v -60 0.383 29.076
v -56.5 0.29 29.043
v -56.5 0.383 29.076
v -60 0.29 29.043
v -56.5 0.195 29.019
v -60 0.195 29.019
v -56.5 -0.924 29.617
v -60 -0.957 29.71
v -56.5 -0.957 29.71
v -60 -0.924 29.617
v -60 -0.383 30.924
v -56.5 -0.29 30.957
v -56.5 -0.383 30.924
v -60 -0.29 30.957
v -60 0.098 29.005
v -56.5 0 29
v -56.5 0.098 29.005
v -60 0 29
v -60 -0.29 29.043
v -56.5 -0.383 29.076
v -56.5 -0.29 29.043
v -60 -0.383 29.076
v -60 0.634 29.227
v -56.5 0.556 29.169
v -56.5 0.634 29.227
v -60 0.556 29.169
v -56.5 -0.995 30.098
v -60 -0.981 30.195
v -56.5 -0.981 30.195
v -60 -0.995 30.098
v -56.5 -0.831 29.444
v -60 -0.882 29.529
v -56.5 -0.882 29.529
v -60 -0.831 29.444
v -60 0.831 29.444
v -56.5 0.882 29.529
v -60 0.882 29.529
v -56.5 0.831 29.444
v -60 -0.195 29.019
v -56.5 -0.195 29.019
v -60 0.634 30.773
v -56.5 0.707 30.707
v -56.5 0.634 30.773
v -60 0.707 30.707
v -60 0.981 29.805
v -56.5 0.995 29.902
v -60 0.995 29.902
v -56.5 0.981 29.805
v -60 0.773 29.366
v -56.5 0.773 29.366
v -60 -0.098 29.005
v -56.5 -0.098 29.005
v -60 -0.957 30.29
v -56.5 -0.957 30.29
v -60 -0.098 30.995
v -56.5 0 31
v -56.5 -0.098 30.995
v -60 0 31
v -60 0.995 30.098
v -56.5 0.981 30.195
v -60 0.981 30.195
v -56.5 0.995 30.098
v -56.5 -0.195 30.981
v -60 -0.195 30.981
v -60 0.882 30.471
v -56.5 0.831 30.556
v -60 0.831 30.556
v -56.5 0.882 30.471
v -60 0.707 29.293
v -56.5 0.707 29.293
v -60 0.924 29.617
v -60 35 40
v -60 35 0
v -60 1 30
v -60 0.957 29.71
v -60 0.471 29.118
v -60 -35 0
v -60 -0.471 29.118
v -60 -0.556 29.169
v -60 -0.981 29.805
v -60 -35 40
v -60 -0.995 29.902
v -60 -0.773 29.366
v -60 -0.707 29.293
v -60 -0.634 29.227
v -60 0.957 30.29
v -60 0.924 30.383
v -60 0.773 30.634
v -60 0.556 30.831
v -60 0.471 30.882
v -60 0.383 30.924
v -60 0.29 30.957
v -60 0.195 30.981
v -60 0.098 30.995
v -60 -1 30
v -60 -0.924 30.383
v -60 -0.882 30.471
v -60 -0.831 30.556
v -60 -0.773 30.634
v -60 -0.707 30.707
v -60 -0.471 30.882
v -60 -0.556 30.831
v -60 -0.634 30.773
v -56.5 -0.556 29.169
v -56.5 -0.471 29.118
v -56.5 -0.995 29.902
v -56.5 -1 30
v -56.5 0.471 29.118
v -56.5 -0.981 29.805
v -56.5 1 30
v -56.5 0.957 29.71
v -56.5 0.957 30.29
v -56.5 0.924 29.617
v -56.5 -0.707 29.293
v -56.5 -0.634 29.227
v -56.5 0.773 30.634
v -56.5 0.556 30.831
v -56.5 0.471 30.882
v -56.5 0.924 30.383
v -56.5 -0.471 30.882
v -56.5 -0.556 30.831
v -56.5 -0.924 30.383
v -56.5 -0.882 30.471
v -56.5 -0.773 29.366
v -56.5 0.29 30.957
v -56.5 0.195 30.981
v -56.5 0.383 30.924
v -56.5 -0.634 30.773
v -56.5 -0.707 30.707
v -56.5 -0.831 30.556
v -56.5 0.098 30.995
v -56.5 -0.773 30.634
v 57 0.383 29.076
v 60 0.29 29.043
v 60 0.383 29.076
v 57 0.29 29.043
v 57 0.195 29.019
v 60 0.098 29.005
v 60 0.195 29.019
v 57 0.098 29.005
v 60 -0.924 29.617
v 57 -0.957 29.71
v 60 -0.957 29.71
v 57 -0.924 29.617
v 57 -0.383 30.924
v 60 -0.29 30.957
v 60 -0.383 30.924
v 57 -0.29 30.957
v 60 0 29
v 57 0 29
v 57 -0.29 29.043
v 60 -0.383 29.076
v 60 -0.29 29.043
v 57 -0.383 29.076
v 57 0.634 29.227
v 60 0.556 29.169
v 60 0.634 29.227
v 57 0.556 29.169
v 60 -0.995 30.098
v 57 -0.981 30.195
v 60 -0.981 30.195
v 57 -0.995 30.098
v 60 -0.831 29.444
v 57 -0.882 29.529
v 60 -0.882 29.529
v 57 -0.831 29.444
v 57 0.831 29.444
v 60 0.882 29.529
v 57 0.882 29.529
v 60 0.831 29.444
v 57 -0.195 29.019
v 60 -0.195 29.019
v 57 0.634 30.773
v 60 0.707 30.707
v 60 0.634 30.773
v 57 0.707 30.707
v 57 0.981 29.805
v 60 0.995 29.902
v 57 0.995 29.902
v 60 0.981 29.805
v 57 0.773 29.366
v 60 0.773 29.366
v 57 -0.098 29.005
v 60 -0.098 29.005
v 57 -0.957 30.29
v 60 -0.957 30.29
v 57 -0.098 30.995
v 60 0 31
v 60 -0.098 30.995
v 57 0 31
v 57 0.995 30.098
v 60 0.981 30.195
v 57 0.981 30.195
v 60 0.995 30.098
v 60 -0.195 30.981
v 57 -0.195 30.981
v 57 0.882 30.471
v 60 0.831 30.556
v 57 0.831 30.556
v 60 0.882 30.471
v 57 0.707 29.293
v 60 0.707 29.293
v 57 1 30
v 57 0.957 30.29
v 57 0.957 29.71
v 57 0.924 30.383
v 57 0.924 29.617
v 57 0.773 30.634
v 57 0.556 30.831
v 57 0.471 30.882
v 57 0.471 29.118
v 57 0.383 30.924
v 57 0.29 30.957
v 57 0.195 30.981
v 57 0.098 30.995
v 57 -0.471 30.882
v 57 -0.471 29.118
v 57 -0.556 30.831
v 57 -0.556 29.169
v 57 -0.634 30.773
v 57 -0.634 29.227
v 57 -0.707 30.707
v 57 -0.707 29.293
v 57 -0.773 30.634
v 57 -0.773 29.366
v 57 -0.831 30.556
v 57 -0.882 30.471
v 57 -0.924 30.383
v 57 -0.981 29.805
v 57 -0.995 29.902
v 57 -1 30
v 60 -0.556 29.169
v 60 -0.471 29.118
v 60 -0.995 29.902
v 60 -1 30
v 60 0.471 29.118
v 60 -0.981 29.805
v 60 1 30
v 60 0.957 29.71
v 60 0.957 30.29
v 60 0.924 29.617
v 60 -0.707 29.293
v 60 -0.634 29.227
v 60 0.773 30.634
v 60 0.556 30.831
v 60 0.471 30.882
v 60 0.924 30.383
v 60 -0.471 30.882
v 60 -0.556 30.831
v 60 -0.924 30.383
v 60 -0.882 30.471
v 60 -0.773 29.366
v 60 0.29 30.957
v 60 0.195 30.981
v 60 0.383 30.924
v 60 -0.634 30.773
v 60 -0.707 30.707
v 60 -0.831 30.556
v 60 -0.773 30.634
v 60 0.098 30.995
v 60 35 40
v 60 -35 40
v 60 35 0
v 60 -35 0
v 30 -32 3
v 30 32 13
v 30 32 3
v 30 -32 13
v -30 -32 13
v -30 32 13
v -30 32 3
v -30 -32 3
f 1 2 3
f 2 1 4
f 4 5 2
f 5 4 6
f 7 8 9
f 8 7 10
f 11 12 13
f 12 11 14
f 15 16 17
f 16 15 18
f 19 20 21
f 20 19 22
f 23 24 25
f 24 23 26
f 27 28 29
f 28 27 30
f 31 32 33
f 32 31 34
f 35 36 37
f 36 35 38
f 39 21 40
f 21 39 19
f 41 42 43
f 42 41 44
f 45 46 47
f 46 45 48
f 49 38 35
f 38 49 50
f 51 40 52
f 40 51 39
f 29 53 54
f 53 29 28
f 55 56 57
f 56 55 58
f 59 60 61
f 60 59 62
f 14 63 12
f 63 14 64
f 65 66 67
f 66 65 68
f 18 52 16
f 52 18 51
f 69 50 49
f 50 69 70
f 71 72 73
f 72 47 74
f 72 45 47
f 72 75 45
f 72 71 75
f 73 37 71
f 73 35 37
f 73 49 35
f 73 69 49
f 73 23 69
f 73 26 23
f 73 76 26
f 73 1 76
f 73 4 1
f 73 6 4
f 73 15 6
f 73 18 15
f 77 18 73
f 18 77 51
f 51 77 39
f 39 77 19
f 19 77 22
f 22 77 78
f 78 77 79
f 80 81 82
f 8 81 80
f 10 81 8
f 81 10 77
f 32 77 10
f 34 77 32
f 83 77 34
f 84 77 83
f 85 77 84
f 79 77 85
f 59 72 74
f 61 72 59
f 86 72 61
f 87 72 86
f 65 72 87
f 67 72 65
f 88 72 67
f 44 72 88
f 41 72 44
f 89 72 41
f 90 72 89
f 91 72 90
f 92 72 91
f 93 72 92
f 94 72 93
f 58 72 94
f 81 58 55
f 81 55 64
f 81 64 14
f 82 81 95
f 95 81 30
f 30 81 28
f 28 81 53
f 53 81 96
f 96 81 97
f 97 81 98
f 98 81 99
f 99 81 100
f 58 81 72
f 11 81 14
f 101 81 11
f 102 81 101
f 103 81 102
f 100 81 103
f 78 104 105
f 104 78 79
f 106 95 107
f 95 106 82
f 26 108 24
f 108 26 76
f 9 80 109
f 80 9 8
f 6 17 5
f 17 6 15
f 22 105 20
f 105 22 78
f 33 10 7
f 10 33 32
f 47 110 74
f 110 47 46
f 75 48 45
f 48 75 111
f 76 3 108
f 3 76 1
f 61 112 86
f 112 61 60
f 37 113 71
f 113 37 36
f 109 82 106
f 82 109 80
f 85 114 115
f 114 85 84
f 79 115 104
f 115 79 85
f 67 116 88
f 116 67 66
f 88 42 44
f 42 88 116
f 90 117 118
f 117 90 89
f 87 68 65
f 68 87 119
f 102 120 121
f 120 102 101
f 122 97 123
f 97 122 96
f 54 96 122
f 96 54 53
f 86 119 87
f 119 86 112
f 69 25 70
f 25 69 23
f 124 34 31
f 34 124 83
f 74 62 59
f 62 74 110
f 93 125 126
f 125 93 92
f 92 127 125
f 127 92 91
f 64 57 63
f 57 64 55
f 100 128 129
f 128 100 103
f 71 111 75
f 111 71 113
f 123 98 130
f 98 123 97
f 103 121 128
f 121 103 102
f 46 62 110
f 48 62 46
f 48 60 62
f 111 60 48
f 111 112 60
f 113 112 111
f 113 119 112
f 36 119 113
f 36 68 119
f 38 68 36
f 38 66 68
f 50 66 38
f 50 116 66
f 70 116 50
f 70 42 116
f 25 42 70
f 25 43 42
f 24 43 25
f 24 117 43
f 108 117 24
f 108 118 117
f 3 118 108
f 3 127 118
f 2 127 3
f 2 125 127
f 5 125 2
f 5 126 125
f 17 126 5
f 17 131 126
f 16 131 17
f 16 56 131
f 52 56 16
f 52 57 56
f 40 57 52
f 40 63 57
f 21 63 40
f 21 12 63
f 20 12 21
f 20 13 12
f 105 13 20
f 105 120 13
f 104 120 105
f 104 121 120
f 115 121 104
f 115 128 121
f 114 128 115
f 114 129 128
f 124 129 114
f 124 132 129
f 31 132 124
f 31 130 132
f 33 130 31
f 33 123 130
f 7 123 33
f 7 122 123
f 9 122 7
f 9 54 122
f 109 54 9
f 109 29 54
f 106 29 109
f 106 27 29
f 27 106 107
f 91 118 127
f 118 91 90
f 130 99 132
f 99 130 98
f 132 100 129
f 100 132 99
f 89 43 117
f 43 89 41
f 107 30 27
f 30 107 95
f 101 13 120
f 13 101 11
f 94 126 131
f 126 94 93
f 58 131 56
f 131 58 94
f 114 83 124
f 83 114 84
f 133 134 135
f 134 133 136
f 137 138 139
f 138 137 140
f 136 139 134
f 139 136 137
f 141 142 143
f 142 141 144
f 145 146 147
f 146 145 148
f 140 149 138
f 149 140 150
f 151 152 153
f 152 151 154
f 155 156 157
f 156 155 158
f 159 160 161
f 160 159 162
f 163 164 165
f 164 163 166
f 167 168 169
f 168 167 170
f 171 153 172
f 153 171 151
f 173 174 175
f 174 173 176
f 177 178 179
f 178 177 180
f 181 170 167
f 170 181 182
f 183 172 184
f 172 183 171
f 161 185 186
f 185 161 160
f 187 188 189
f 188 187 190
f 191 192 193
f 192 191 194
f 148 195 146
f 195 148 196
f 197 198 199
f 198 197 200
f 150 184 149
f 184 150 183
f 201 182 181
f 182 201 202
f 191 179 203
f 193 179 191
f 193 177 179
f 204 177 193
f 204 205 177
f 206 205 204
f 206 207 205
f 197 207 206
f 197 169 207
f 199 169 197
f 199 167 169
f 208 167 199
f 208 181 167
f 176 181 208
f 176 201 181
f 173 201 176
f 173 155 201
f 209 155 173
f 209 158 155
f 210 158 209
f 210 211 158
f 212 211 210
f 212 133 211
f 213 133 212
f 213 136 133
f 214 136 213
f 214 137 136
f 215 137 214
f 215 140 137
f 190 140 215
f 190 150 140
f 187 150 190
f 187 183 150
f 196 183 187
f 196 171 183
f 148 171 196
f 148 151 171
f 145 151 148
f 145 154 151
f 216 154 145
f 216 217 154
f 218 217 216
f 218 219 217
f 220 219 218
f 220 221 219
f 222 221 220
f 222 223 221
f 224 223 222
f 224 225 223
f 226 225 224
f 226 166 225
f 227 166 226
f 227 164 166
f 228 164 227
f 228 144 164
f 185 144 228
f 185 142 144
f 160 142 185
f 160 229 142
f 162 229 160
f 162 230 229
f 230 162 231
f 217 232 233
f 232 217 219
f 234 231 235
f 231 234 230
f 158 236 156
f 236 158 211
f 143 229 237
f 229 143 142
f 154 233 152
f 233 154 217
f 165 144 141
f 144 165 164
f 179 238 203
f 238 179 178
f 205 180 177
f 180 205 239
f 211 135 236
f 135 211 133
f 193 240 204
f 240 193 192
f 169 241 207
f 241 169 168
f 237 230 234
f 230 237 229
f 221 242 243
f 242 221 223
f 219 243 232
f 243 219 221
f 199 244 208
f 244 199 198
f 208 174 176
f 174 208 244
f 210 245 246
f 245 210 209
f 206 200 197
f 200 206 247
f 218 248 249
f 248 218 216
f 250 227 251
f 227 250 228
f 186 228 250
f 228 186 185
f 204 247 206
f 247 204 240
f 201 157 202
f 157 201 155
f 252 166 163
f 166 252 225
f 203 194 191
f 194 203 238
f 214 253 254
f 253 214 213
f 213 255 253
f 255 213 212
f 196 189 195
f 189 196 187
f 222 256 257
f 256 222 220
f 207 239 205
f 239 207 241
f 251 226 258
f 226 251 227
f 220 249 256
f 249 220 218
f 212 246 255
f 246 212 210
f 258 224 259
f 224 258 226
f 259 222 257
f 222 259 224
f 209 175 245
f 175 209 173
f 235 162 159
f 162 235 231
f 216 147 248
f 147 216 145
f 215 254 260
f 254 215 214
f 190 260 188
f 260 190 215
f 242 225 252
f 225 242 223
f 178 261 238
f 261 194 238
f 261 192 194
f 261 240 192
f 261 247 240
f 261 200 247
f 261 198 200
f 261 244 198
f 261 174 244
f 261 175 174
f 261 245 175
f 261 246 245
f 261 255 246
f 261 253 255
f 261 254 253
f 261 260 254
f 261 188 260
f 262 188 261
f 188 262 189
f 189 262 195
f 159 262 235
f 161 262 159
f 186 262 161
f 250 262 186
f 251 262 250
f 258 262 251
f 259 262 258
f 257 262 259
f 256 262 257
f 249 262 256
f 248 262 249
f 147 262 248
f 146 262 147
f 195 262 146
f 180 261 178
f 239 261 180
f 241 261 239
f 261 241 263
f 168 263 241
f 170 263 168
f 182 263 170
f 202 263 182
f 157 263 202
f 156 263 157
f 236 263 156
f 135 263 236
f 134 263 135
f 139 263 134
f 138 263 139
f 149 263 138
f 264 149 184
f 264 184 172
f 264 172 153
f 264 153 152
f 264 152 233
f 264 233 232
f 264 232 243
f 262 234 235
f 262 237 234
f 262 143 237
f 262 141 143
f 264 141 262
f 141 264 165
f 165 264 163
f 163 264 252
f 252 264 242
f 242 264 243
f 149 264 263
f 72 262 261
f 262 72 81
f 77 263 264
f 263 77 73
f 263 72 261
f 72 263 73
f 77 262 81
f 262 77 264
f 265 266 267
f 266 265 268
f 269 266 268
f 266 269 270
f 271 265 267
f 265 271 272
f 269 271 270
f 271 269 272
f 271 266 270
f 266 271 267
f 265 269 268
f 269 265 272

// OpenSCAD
// Mini horizontal gel-electrophoresis buffer tank
// Print orientation: open top facing up (+Z), resting on XY plane at z = 0

// ---------------- Parameters ----------------
tank_x      = 120;   // outer length in X (mm)
tank_y      = 70;    // outer width in Y (mm)
tank_h      = 40;    // outer height in Z (mm)
wall        = 3;     // wall thickness (mm)
floor       = 3;     // floor thickness (mm)

platform_x  = 60;    // platform length in X (mm), centred
platform_y  = tank_y - 2 * wall;  // platform spans full inner width
platform_top = floor + 10;  // platform top height (z = 13)

hole_d      = 2;     // electrode hole diameter (mm)
hole_y      = 0;     // electrode hole Y position (mm)
hole_z      = 30;    // electrode hole Z position (mm)

eps         = 0.5;   // cutter overshoot past faces (mm)

$fn = 96;

// ---------------- Derived ----------------
inner_x = tank_x - 2 * wall;   // 114 mm
inner_z = tank_h - floor;      // 37 mm (floor at bottom, open top)

// ---------------- Model ----------------
difference() {
    // Main tank body
    translate([-tank_x/2, -tank_y/2, 0])
        cube([tank_x, tank_y, tank_h]);

    // Raised platform in the middle (solid, no cut through to top)
    translate([-platform_x/2, -platform_y/2, floor])
        cube([platform_x, platform_y, platform_top - floor]);

    // Electrode holes through each end wall, along X
    for (sx = [-1, 1])
        translate([sx > 0 ? tank_x/2 - wall : -tank_x/2, hole_y, hole_z])
            rotate([0, 90, 0])
                cylinder(d = hole_d, h = wall + eps, $fn = 64);
}
